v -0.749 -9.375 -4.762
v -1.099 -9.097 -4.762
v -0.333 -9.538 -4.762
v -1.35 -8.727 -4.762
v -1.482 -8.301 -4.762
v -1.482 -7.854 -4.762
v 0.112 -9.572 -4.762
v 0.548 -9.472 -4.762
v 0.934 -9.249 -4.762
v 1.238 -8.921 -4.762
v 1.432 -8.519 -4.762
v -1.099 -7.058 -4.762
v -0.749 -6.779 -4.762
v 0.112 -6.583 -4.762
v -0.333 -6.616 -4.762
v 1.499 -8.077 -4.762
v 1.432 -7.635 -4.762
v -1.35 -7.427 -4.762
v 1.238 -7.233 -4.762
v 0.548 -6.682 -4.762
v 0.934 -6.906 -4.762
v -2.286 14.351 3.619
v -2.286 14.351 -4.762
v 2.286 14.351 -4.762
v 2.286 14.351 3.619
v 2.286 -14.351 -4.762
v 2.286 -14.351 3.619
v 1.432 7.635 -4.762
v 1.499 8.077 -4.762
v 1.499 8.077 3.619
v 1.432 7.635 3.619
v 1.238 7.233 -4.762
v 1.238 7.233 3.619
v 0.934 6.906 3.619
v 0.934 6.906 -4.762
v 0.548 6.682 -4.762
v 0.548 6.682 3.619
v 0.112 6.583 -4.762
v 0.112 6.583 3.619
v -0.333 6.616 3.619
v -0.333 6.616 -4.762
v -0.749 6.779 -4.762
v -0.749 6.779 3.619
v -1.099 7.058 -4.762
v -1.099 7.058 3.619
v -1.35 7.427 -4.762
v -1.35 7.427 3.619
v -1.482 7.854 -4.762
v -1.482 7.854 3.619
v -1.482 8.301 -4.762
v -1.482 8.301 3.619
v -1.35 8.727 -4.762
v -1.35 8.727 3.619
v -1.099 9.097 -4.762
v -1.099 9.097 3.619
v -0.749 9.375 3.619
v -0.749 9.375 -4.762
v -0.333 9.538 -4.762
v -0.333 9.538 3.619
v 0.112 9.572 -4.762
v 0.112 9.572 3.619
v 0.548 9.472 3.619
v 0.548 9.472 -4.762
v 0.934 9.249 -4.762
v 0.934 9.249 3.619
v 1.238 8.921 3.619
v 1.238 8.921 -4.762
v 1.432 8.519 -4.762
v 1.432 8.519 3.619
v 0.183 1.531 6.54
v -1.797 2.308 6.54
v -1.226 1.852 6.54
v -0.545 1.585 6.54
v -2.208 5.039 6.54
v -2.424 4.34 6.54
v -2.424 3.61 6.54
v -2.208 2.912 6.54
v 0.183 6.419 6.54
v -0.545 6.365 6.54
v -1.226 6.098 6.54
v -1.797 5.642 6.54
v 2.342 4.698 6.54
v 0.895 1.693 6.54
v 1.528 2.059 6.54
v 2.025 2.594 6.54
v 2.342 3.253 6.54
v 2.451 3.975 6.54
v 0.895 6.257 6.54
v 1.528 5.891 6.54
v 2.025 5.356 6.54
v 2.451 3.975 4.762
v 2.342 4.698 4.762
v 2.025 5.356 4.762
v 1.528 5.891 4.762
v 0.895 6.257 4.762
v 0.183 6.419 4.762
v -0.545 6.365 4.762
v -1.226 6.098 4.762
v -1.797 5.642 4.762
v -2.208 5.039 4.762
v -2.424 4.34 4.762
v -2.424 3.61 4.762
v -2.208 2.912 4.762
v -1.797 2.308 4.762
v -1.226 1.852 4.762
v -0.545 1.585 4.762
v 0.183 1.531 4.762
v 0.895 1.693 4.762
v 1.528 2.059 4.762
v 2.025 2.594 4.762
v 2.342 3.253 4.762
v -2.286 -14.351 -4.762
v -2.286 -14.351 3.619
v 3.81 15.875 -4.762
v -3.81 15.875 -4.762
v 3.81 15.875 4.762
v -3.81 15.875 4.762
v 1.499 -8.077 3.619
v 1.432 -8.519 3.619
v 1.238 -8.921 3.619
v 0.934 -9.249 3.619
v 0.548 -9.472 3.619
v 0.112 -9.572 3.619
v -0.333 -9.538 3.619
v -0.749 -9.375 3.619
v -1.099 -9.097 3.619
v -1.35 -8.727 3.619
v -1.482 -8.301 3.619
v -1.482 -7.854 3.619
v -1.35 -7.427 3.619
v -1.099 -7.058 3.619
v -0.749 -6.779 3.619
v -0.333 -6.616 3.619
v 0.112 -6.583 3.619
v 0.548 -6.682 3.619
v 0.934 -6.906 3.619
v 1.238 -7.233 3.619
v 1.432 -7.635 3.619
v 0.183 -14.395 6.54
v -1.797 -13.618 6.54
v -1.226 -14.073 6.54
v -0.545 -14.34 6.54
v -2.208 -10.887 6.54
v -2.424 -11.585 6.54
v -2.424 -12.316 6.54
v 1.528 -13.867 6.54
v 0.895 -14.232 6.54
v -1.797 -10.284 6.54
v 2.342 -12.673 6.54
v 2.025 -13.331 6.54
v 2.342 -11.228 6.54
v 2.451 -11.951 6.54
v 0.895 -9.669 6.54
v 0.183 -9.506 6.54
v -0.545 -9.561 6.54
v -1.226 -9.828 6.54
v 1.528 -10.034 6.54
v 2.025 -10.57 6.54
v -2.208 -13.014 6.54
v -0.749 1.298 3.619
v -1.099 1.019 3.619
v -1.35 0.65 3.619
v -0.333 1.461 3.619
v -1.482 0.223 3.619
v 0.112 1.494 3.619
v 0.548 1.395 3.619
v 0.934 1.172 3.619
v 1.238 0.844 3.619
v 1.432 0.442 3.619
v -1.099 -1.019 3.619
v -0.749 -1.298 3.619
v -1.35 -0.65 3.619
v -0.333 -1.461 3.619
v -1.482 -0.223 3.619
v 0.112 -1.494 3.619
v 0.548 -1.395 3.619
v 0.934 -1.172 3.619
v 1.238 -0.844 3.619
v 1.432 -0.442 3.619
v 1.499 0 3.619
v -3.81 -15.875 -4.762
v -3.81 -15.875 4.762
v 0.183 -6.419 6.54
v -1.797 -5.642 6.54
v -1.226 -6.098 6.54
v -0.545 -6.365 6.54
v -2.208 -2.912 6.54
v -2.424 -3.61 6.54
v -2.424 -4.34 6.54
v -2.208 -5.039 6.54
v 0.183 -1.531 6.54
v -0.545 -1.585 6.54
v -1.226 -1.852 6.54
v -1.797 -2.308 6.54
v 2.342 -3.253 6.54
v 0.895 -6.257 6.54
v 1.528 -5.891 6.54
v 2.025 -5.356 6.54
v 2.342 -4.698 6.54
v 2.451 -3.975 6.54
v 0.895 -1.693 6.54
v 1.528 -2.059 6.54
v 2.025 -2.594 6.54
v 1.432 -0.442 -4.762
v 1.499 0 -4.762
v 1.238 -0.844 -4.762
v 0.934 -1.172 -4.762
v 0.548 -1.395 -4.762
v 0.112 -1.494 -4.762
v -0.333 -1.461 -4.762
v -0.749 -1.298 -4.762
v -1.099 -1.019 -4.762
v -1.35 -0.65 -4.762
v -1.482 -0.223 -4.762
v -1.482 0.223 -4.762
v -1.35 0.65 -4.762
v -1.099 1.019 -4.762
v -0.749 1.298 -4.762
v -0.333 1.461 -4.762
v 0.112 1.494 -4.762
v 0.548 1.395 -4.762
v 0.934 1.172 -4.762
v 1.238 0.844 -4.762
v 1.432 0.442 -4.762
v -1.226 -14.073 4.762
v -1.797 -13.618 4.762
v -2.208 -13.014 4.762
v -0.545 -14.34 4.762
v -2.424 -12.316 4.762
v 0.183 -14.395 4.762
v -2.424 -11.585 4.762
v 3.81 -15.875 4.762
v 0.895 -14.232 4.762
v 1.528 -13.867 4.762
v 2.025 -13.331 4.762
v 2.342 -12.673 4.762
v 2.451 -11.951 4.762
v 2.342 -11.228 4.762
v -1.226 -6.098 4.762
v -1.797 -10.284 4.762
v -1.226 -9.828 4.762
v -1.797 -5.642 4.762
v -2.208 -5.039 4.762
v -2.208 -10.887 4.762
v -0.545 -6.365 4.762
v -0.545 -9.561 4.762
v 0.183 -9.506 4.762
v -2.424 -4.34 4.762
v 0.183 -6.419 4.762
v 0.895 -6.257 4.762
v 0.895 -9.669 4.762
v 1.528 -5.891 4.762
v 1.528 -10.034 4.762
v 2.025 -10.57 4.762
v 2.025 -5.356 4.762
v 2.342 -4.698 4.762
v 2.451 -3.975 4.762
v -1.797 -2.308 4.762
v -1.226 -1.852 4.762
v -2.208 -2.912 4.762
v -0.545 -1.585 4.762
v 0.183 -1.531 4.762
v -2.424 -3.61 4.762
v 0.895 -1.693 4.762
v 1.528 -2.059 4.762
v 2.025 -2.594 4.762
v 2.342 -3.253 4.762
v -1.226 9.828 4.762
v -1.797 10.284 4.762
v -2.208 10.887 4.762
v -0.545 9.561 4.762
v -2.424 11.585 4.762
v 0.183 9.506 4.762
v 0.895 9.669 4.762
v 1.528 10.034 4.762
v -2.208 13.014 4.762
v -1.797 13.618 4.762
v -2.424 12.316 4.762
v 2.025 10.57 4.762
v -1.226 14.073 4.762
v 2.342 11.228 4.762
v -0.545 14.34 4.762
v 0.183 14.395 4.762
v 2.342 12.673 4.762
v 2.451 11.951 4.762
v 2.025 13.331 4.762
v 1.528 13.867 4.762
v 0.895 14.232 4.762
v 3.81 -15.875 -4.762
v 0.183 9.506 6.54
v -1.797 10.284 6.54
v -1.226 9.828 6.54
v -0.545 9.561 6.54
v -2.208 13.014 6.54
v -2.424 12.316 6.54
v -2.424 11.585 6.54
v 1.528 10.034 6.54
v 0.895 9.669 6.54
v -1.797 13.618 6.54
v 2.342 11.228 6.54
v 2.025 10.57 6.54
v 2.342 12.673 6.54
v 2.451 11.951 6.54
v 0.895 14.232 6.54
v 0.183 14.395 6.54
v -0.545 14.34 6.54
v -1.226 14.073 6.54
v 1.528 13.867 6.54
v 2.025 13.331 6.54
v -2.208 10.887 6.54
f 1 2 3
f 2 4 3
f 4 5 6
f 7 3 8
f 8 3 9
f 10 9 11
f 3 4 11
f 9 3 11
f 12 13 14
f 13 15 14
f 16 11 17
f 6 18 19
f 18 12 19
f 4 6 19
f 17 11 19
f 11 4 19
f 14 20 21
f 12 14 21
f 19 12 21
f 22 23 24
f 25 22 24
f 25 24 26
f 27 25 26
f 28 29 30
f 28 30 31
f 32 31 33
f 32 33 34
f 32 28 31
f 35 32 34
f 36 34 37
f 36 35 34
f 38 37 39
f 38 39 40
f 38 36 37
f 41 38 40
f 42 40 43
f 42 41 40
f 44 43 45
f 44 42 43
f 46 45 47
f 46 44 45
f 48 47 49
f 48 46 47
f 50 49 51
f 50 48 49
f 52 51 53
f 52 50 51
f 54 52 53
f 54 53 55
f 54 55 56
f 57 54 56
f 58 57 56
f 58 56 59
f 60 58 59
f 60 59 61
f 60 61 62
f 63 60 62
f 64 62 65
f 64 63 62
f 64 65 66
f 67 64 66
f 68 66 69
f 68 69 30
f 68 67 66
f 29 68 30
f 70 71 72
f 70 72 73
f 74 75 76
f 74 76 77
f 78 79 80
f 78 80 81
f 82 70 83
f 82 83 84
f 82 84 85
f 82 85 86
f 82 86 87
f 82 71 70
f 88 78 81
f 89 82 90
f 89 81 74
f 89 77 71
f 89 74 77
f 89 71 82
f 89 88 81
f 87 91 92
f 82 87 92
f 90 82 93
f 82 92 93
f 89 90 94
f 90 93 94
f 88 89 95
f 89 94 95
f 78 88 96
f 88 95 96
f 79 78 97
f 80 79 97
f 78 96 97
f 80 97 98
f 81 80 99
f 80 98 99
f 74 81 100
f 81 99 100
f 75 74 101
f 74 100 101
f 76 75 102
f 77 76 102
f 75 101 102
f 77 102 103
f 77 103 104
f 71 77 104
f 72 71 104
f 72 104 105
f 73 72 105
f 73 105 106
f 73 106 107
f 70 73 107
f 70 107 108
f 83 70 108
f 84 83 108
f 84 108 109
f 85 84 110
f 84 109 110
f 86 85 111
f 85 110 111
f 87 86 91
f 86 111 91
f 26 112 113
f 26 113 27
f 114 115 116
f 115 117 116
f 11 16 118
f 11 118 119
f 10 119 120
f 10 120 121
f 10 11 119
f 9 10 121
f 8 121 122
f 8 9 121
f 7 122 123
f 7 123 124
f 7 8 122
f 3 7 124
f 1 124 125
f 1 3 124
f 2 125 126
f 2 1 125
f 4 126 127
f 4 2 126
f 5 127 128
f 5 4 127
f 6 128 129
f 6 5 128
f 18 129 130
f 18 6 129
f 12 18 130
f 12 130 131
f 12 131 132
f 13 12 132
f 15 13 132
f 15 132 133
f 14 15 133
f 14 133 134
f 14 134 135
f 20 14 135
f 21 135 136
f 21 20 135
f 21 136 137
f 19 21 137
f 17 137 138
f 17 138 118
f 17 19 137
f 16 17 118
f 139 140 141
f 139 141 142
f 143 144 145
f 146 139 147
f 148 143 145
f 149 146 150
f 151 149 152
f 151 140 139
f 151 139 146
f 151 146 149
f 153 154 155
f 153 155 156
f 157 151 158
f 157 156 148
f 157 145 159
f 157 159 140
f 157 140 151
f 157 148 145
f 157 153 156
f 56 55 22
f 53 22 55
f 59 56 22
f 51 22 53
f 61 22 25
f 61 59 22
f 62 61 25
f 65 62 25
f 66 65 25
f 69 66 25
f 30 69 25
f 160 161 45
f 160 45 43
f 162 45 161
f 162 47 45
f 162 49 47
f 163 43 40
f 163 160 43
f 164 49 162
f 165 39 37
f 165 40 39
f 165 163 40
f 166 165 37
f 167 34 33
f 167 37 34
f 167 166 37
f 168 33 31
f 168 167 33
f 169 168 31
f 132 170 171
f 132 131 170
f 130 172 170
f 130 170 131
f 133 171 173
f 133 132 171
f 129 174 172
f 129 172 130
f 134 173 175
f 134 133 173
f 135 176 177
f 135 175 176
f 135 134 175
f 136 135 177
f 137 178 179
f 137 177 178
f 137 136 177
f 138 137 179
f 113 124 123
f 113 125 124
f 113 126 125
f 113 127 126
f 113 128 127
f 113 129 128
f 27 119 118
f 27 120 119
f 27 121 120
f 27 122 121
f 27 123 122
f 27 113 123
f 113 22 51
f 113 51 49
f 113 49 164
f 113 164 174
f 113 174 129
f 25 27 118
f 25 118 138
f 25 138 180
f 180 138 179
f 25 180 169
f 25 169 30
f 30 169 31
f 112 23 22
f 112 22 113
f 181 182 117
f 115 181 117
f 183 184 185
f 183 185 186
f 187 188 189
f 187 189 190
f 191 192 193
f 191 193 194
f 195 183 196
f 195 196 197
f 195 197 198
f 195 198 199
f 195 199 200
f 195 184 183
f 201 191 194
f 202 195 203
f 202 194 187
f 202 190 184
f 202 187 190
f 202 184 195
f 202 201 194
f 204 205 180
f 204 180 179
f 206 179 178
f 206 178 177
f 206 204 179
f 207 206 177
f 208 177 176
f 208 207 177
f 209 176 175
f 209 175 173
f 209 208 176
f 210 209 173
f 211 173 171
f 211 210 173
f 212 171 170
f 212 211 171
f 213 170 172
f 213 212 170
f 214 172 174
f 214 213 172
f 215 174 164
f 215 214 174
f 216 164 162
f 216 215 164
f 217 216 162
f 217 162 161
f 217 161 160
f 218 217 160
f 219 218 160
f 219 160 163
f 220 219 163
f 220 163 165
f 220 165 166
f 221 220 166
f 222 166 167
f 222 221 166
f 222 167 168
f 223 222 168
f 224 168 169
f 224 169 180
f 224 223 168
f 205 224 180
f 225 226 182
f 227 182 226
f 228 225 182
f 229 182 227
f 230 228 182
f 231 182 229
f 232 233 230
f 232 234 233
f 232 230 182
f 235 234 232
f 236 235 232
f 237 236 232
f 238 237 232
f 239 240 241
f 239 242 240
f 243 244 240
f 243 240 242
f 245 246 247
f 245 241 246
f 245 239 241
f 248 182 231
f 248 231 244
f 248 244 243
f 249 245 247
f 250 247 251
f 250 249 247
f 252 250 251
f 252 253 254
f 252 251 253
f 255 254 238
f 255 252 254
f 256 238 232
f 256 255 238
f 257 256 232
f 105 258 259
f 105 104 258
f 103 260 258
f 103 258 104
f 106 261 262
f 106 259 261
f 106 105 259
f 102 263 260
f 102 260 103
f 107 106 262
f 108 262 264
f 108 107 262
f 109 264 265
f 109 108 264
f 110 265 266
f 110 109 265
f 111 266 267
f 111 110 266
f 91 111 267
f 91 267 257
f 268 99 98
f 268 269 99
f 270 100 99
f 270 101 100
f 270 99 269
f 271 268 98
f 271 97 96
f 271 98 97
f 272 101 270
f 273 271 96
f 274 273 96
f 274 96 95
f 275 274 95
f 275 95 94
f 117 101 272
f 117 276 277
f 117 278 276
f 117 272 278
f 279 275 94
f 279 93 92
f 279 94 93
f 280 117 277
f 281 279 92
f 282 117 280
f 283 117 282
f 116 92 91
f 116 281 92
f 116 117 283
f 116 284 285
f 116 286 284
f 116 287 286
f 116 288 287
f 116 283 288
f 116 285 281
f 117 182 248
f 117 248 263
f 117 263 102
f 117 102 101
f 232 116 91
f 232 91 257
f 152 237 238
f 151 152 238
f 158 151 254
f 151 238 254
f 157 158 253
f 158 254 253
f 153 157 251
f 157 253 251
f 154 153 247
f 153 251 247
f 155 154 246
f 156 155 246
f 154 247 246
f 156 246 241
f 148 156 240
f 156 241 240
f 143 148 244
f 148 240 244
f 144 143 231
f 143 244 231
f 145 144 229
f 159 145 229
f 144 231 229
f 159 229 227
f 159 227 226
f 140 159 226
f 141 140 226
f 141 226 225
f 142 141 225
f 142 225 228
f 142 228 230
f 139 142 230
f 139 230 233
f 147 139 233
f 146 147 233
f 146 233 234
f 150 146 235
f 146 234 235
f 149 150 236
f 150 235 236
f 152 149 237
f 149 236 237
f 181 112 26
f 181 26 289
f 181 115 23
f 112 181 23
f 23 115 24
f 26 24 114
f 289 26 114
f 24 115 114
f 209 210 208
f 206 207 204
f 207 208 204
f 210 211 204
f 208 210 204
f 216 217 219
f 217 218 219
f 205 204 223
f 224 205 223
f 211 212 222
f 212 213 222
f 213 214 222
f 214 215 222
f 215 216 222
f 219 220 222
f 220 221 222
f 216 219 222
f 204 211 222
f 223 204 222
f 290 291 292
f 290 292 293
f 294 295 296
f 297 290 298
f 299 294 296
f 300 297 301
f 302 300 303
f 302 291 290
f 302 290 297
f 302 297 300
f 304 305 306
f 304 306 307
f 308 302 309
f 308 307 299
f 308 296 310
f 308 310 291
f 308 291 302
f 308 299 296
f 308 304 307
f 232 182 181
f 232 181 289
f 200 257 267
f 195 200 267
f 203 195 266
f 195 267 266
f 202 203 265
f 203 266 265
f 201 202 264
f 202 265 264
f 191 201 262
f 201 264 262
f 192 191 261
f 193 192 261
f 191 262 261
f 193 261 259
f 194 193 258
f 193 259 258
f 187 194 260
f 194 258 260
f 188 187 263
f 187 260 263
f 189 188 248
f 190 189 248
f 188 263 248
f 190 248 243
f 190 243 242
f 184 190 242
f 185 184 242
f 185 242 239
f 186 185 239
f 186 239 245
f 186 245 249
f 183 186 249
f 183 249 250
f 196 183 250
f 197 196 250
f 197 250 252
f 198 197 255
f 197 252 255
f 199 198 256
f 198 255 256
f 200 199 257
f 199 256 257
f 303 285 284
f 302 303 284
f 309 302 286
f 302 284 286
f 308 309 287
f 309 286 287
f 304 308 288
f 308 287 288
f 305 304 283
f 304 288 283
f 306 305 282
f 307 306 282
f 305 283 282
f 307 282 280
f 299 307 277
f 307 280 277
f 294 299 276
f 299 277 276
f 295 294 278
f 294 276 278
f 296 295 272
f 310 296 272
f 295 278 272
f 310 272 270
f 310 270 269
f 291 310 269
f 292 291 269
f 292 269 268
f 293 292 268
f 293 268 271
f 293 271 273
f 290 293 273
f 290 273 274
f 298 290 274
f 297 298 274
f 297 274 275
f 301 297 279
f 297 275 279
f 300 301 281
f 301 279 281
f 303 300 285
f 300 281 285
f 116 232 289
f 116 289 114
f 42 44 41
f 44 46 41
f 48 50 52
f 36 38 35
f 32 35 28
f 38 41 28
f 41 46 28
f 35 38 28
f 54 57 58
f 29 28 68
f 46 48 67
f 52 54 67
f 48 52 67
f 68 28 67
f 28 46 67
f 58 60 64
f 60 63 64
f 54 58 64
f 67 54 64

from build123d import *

# Parameters (mm, degrees)
F0_W     = 7.62
F0_H     = 31.75
F1_DEPTH = 4.7625
F2_R     = 2.4511
F3_DEPTH = 1.778
F4_W     = 4.572
F4_H     = 28.702
F4_R     = 1.4986
F5_DEPTH = 8.382


with BuildPart() as f1:
    # F0 (on Top) → F1 (new body, symmetric)
    with BuildSketch(Plane.XY):
        Rectangle(F0_W, F0_H)
    extrude(amount=F1_DEPTH, both=True)

    # F2 (on face) → F3 (join)
    with BuildSketch(Plane.XY.offset(4.7625)):
        with Locations((0, 11.9507)):
            Circle(F2_R)
        with Locations((0, 3.9751)):
            Circle(F2_R)
        with Locations((0, -3.9751)):
            Circle(F2_R)
        with Locations((0, -11.9507)):
            Circle(F2_R)
    extrude(amount=F3_DEPTH)

    # F4 (on face) → F5 (cut)
    with BuildSketch(Plane(origin=(0, 0, -4.7625), x_dir=(1, 0, 0), z_dir=(0, 0, -1))):
        Rectangle(F4_W, F4_H)
        with Locations((0, -8.0772)):
            Circle(F4_R, mode=Mode.SUBTRACT)
        Circle(F4_R, mode=Mode.SUBTRACT)
        with Locations((0, 8.0772)):
            Circle(F4_R, mode=Mode.SUBTRACT)
    extrude(amount=-F5_DEPTH, mode=Mode.SUBTRACT)


solid = f1.part
